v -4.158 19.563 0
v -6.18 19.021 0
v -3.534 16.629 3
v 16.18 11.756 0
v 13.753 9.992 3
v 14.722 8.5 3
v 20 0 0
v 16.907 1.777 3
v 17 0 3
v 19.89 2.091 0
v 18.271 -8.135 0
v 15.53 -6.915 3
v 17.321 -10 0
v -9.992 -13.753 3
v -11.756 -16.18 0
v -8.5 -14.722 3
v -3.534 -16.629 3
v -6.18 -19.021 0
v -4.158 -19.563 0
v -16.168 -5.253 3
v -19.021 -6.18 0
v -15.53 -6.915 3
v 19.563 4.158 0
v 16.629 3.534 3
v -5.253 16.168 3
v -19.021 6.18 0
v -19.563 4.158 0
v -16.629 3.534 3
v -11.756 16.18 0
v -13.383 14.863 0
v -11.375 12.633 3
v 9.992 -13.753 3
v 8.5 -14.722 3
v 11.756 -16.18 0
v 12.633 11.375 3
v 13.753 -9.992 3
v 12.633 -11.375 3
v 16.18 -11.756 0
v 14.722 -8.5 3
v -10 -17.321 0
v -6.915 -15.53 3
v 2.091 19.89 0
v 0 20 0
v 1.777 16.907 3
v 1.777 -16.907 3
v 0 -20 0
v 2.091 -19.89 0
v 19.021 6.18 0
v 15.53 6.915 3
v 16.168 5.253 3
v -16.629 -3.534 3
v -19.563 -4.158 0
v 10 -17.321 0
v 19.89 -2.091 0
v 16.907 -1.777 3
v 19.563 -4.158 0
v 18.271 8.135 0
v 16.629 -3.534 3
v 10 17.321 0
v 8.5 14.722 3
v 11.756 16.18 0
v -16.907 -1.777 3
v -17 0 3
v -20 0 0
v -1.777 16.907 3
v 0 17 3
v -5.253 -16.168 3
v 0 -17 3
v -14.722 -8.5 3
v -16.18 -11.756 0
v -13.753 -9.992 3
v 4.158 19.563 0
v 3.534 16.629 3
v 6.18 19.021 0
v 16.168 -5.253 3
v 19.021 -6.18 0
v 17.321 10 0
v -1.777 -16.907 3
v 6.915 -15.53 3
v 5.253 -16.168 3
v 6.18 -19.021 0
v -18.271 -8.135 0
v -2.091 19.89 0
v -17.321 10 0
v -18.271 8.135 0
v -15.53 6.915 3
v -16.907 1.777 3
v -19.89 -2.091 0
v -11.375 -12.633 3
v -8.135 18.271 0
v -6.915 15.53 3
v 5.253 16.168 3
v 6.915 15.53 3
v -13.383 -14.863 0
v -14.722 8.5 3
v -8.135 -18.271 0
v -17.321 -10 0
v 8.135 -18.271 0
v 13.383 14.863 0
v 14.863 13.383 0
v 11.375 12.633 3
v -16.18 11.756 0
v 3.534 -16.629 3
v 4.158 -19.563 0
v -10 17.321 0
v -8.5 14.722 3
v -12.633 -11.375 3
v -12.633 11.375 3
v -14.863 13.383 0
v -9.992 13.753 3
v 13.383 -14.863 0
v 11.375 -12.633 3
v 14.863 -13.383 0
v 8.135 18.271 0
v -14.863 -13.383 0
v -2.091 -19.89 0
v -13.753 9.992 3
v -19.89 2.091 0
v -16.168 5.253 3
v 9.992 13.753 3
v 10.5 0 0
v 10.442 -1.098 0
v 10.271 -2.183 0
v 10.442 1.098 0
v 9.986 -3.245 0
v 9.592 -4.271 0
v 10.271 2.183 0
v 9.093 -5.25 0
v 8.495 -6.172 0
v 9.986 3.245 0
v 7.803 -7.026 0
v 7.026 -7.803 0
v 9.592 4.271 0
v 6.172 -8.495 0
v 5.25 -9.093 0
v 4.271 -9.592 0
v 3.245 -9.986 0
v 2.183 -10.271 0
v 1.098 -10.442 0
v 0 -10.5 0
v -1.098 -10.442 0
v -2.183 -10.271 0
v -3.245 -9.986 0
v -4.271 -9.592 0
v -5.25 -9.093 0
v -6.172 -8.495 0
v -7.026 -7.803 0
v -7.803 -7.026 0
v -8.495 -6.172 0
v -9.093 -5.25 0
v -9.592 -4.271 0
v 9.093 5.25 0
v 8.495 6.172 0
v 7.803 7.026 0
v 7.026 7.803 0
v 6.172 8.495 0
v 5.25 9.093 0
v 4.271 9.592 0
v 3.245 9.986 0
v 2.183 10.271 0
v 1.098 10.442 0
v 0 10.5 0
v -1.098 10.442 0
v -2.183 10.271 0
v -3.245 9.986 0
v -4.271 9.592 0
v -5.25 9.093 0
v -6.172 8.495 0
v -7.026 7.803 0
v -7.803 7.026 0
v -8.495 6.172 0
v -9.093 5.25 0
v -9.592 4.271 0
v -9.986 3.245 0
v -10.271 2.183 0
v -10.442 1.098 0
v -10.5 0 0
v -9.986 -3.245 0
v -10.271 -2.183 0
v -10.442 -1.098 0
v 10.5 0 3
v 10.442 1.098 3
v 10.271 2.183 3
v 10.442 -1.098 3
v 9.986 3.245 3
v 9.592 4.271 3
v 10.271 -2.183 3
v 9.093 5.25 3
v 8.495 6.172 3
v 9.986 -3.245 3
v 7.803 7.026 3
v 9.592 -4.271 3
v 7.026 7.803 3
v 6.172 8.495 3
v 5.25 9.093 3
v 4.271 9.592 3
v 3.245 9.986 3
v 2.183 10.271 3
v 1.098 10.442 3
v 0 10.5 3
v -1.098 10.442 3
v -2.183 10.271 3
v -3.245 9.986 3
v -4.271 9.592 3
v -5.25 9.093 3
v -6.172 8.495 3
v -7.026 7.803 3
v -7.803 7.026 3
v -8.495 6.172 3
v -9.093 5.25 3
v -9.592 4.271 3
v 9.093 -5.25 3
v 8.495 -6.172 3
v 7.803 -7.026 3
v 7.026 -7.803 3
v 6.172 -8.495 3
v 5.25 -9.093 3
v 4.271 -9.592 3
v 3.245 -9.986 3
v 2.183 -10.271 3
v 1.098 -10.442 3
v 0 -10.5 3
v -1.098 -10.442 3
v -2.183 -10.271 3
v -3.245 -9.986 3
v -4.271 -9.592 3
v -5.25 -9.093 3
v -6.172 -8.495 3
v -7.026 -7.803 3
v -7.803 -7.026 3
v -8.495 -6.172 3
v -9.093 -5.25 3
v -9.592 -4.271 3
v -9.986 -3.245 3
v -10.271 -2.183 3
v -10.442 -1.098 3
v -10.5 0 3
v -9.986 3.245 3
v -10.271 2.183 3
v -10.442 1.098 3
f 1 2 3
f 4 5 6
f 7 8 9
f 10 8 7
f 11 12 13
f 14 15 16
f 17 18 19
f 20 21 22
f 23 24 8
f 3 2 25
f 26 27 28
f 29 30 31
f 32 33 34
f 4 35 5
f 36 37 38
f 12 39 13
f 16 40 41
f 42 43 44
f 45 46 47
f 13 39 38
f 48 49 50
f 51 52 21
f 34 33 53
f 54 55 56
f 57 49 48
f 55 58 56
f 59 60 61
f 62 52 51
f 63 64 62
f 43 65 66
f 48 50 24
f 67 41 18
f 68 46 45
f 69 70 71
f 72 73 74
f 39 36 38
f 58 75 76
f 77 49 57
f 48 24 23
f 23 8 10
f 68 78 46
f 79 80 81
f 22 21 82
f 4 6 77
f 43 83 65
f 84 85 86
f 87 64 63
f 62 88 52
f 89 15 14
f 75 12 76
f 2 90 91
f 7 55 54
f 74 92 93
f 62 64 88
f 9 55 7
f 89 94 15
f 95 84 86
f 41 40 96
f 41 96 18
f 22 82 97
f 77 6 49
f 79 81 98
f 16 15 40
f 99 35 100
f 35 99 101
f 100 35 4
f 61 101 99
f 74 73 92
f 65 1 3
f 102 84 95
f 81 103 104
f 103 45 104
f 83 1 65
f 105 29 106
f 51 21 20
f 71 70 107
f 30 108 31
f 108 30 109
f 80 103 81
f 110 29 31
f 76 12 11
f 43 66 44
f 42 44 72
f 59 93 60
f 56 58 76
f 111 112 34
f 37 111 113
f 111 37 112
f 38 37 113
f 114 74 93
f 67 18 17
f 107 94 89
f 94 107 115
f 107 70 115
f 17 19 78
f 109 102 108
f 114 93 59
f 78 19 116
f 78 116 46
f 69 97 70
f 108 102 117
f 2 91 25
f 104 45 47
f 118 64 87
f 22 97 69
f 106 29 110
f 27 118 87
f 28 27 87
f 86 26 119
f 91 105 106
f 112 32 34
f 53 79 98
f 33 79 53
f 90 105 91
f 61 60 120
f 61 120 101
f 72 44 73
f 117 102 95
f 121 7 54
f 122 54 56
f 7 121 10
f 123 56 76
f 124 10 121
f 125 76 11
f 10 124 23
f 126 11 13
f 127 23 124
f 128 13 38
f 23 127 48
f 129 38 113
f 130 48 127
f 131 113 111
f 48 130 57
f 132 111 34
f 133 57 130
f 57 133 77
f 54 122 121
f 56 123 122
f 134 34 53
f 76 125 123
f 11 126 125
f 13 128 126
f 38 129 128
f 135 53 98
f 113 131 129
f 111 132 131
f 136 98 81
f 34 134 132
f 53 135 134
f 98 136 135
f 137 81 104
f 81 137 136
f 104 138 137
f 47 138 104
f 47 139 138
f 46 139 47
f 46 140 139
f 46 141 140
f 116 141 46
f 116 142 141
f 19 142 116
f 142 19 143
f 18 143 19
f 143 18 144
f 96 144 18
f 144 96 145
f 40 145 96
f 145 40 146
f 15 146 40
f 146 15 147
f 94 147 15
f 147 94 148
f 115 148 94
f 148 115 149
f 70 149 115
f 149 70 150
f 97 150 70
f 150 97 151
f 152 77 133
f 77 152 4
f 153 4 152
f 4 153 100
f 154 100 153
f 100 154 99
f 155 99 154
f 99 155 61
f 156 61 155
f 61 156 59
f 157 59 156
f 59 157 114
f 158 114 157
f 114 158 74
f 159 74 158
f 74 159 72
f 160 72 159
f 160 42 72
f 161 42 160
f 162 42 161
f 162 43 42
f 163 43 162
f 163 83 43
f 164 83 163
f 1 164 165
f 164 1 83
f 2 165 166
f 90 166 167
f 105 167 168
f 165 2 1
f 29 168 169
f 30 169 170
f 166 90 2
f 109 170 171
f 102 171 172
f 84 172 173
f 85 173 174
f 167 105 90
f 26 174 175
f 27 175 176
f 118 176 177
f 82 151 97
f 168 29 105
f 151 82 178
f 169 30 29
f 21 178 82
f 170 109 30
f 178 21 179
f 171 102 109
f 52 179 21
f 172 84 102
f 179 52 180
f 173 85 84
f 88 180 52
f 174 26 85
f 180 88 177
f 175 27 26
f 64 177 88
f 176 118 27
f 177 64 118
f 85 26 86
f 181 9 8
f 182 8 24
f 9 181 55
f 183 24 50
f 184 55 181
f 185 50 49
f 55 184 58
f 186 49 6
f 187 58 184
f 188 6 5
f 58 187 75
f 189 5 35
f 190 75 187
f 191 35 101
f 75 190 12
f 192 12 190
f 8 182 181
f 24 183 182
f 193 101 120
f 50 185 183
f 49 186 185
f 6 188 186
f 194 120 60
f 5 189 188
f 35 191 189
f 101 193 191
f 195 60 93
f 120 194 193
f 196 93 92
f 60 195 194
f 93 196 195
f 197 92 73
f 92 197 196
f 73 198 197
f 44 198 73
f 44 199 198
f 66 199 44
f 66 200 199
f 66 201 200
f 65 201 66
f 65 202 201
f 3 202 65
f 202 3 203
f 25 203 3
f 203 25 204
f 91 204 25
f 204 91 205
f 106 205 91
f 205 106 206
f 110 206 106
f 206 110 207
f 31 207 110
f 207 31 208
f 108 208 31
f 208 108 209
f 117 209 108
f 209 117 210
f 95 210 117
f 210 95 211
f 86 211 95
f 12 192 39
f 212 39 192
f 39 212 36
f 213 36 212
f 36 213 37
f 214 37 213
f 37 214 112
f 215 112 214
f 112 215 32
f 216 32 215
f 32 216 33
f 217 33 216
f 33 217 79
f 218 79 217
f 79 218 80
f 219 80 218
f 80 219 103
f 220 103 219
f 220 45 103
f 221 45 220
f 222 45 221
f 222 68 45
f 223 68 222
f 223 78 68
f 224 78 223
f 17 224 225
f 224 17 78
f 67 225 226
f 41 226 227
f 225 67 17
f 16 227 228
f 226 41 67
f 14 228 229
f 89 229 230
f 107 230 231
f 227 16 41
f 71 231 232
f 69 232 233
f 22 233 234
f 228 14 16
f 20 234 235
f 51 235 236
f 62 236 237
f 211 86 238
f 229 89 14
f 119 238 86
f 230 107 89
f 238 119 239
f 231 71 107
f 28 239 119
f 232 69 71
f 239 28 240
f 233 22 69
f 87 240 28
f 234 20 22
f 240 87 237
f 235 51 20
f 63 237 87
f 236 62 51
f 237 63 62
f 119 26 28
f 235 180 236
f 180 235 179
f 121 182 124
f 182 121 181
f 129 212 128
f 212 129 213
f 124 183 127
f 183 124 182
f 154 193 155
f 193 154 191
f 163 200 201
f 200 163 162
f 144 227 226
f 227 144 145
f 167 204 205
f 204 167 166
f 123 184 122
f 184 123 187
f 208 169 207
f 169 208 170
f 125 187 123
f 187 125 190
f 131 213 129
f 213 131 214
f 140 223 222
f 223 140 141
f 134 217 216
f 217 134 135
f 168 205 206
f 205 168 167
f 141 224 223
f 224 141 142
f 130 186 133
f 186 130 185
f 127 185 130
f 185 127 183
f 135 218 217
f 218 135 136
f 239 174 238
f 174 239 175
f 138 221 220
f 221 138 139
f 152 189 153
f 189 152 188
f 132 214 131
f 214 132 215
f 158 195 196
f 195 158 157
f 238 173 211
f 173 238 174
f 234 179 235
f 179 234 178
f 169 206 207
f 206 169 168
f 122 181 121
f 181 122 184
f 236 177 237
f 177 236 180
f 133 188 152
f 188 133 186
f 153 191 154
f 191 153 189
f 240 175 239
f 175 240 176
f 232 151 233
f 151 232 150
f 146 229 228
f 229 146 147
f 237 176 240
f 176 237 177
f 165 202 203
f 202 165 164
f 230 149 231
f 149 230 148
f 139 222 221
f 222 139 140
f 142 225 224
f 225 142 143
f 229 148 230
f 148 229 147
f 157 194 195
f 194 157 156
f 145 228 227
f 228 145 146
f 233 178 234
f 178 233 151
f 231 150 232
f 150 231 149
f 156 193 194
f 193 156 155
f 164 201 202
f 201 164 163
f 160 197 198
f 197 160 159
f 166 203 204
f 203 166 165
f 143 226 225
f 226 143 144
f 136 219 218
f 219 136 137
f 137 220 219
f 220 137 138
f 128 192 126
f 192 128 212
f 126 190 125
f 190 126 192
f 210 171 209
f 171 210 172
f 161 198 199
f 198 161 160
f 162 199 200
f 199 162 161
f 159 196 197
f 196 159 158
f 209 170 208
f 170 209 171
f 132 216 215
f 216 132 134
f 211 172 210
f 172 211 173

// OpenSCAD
// Conical spring washer.
$fn = 60;
eps = 0.02;
inner_d = 21;
outer_d = 40;
thickness = 3;
difference() {
    cylinder(d1=outer_d,d2=outer_d-2*thickness,h=thickness);
    translate([0,0,-eps]) cylinder(d=inner_d,h=thickness+2*eps);
}
